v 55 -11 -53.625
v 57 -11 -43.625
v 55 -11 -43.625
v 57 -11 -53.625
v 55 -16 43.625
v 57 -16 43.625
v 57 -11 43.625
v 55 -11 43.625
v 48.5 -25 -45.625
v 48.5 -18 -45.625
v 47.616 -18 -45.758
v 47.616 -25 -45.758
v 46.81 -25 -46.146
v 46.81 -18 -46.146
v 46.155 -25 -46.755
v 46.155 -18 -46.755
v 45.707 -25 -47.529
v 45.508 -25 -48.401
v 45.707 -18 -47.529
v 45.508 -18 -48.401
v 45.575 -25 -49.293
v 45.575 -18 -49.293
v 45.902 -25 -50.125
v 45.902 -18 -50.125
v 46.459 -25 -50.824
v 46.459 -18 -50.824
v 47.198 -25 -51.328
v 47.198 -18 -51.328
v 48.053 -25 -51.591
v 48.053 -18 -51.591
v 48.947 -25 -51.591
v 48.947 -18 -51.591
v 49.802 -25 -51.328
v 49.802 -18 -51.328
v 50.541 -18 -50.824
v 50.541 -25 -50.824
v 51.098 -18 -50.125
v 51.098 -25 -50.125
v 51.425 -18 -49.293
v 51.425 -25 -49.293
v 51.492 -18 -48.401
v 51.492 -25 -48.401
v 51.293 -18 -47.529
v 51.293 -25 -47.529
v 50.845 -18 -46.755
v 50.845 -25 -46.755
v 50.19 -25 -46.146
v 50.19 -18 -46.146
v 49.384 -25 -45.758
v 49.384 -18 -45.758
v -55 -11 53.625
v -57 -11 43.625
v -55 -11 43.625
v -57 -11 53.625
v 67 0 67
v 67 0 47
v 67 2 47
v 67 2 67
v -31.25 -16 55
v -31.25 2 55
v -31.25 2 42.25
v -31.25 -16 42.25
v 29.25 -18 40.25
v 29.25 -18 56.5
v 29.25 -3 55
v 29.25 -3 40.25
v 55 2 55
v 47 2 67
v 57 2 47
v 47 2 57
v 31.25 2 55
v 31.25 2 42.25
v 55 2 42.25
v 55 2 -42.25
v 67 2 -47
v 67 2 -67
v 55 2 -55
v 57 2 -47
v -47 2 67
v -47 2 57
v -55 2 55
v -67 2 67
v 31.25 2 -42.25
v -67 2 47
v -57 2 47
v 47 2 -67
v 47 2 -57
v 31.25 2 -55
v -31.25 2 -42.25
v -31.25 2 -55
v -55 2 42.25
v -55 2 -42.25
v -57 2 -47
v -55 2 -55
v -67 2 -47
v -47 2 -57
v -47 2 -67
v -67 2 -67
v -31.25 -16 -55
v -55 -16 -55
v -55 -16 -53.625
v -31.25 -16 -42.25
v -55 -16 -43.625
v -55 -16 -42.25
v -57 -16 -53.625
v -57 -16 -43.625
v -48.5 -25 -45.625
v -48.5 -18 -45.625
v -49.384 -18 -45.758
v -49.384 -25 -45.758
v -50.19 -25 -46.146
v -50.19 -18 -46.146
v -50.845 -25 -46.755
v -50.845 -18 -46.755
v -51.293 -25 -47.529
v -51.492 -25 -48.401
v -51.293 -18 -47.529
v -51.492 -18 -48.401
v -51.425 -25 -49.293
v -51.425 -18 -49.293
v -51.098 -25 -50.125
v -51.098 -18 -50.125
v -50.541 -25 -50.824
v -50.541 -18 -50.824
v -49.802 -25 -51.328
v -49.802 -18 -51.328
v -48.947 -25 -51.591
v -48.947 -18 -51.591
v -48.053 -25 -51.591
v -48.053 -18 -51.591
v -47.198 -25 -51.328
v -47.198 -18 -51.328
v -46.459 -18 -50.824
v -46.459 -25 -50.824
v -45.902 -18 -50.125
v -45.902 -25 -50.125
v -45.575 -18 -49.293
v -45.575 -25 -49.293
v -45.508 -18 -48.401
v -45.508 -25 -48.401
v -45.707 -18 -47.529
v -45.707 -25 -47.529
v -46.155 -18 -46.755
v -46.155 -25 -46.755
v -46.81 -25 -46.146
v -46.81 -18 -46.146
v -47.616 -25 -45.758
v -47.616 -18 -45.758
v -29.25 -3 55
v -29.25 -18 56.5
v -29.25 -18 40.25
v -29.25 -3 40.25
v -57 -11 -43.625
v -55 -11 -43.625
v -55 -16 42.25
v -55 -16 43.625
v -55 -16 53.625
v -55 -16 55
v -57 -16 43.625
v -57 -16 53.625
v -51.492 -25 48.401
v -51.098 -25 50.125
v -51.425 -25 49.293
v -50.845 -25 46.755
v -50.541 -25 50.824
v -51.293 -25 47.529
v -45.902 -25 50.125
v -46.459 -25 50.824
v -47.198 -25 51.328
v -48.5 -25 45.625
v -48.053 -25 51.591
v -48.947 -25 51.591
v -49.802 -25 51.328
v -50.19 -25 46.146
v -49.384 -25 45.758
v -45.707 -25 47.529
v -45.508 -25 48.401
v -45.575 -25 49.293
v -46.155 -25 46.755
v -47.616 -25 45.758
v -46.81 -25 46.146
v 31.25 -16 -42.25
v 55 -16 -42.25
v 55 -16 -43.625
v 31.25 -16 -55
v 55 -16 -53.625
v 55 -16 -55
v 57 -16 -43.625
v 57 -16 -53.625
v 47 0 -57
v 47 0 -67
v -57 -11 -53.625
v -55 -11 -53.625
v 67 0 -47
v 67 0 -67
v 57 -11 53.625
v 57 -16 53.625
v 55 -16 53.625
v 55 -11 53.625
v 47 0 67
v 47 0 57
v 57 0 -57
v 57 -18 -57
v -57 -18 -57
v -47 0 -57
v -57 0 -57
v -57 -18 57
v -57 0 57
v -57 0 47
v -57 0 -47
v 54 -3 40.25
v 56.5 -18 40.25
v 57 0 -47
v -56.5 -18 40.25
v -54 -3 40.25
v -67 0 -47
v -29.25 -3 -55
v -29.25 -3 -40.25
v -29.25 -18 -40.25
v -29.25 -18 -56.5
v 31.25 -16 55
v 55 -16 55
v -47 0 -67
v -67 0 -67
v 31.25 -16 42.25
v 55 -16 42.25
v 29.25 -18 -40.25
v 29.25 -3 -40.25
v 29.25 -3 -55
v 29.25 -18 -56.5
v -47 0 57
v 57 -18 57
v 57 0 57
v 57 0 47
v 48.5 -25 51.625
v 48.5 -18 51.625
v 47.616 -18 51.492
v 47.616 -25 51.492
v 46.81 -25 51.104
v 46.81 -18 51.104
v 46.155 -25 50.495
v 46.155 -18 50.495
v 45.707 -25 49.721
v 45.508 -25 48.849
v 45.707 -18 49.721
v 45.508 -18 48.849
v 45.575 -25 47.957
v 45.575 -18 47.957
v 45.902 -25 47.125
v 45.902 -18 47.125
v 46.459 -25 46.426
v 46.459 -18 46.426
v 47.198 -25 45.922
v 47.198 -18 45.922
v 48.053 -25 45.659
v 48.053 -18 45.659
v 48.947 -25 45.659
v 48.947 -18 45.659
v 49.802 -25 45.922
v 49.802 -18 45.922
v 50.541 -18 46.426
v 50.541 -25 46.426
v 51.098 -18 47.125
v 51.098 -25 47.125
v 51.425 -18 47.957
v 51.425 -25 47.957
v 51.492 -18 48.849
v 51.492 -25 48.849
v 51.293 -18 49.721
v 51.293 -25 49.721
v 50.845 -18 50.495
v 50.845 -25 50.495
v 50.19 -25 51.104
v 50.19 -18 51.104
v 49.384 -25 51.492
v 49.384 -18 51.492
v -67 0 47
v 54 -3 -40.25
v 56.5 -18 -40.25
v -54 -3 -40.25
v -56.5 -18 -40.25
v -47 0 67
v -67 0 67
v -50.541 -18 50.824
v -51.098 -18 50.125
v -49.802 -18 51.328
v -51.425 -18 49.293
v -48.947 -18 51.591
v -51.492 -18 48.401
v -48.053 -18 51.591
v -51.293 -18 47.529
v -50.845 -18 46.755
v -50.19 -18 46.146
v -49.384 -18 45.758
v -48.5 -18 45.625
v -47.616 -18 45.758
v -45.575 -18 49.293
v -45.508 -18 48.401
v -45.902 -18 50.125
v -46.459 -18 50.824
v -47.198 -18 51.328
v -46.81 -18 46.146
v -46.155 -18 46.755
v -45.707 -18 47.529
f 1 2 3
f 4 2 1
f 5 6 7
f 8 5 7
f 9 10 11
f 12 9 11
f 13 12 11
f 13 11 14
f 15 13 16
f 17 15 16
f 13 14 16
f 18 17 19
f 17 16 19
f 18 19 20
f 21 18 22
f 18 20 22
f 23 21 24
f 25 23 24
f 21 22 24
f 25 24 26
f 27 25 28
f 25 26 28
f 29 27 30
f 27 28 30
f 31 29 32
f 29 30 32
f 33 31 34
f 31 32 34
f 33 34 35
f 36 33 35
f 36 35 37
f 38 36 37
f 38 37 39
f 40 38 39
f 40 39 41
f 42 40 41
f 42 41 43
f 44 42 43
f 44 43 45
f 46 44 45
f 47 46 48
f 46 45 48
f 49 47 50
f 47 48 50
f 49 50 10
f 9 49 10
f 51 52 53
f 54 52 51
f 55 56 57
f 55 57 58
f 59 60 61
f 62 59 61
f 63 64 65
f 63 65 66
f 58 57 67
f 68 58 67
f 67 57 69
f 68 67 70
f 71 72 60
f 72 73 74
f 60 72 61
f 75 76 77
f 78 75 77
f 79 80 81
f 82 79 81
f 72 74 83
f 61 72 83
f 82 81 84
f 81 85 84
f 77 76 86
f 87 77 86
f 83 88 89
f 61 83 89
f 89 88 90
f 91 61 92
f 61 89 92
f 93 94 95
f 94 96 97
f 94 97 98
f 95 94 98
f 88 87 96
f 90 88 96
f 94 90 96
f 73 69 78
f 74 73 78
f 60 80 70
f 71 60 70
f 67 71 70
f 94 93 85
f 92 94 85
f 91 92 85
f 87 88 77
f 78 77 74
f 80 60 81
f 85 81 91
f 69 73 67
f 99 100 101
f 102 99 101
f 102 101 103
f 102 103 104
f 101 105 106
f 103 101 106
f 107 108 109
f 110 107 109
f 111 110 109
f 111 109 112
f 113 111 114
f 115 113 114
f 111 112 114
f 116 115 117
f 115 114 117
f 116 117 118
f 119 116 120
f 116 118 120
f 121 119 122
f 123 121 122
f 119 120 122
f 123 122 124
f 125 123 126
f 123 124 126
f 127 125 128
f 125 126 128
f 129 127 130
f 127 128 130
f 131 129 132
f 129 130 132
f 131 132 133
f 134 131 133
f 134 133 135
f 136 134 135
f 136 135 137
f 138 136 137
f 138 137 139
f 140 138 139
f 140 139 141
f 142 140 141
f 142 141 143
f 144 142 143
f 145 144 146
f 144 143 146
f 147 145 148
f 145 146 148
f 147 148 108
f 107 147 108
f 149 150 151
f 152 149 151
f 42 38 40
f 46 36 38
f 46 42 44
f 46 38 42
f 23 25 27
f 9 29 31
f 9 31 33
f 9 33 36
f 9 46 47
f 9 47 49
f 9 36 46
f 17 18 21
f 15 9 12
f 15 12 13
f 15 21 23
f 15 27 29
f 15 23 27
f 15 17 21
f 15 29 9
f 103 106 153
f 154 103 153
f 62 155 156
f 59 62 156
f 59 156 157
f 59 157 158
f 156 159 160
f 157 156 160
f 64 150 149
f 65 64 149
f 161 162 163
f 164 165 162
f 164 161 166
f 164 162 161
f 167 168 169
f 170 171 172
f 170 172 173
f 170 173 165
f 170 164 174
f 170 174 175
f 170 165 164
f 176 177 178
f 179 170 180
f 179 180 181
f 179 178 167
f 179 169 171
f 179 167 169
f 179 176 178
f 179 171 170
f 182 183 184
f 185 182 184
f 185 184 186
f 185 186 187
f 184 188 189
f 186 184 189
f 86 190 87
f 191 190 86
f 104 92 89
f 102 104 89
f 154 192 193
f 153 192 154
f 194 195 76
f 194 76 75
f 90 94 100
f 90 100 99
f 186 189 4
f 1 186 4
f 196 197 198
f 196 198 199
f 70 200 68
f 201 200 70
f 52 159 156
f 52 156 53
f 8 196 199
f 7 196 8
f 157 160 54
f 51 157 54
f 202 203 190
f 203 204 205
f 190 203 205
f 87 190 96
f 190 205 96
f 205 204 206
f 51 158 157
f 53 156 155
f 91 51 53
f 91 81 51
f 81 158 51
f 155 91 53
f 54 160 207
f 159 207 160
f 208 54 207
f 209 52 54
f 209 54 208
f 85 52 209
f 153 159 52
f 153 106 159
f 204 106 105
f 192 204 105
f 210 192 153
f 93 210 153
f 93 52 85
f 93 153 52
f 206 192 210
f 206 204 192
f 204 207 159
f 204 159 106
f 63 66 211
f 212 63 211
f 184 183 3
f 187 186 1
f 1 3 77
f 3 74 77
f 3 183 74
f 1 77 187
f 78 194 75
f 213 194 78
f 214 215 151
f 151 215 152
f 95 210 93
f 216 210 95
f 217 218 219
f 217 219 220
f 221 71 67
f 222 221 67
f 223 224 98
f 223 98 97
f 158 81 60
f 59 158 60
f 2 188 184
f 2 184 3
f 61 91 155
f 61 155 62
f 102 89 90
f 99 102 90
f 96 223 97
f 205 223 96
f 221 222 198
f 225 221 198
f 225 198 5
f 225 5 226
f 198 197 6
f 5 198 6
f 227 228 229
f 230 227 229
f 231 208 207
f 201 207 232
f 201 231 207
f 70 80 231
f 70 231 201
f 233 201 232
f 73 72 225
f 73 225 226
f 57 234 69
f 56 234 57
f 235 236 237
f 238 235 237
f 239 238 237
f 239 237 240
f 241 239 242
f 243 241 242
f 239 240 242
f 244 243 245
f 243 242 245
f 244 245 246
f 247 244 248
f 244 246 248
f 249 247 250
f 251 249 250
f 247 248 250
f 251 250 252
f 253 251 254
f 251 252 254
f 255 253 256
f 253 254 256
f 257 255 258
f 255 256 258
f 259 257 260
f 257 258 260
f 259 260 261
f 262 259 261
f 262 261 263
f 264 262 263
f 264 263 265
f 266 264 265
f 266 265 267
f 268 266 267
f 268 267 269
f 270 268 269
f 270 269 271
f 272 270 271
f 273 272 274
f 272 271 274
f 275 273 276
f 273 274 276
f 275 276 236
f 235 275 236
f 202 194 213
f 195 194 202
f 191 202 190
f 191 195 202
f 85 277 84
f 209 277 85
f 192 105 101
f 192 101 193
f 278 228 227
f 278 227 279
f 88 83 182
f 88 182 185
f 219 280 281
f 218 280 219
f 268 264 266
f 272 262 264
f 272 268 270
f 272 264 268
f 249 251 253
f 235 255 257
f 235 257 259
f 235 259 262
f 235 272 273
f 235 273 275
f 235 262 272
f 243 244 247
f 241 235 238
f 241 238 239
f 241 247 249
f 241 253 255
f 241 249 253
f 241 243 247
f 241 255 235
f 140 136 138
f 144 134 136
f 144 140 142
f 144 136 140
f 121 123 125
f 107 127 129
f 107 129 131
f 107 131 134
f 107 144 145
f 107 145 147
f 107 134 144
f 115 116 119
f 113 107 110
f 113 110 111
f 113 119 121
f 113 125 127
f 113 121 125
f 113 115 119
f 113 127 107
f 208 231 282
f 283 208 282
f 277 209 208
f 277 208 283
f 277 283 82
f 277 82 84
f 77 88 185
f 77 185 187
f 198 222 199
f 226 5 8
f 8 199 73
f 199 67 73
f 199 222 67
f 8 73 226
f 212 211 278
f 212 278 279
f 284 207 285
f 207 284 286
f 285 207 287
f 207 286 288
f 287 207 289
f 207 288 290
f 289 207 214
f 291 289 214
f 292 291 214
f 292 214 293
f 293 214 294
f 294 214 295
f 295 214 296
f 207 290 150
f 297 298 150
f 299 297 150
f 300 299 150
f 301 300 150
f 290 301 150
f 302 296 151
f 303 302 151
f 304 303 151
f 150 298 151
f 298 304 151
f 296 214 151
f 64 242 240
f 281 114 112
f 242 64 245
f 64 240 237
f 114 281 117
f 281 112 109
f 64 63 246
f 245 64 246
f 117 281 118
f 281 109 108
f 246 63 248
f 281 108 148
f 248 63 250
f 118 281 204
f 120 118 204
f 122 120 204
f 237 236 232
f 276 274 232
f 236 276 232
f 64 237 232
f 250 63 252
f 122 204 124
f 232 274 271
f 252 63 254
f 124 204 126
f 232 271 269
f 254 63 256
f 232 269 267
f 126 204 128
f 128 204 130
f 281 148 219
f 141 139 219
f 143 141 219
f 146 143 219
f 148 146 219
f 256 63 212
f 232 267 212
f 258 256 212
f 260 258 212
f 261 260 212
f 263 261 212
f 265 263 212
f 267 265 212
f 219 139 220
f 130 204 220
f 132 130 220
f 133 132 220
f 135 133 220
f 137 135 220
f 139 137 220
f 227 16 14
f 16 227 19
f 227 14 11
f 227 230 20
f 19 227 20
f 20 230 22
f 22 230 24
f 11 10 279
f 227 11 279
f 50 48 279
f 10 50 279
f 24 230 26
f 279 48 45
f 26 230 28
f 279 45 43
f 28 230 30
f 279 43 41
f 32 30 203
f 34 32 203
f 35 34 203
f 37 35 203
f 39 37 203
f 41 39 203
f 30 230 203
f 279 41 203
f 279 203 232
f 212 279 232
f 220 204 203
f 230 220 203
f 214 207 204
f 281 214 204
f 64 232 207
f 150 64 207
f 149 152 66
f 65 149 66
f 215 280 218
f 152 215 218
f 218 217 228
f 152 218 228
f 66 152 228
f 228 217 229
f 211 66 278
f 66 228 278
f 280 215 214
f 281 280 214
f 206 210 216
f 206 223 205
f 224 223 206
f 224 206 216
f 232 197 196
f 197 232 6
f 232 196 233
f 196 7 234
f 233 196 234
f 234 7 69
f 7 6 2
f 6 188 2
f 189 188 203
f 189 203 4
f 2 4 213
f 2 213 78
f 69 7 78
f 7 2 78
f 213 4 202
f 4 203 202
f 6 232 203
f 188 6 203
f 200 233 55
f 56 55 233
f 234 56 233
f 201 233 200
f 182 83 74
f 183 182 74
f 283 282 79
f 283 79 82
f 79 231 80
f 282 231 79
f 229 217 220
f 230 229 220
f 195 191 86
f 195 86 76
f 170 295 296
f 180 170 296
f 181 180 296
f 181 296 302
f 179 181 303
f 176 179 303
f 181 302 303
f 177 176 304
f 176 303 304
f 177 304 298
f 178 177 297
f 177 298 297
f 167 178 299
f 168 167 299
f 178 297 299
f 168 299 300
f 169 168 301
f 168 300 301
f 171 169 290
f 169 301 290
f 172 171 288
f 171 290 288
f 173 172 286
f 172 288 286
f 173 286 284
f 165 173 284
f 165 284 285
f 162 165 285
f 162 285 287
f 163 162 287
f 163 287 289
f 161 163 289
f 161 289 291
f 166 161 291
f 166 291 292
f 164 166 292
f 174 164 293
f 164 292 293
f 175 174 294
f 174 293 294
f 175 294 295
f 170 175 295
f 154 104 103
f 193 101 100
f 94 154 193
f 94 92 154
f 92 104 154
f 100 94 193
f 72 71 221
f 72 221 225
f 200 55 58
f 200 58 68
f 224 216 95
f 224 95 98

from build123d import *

# Parameters (mm, degrees)
BOSS_EXTRUDE1_DEPTH      = 2
BOSS_EXTRUDE1_DEPTH_BACK = 3
SKETCH1_W                = 120
SKETCH1_H                = 120
SKETCH3_W                = 27.75
SKETCH3_H                = 16.75
BOSS_EXTRUDE4_DEPTH      = 18
SKETCH4_W                = 23.75
SKETCH4_H                = 12.75
CUT_EXTRUDE1_DEPTH       = 18
SKETCH5_R                = 3
BOSS_EXTRUDE5_DEPTH      = 7
SKETCH6_W                = 10
SKETCH6_H                = 5
CUT_EXTRUDE2_DEPTH       = 2
SKETCH7_W                = 10
SKETCH7_H                = 5
CUT_EXTRUDE3_DEPTH       = 2
BOSS_EXTRUDE6_REACH      = 112.411
BOSS_EXTRUDE7_REACH      = 121.478
SKETCH12_W               = 120
SKETCH12_H               = 5
CUT_EXTRUDE4_DEPTH       = 3
SKETCH13_W               = 120
SKETCH13_H               = 5
CUT_EXTRUDE5_DEPTH       = 3
SKETCH14_W               = 114
SKETCH14_H               = 5
CUT_EXTRUDE6_DEPTH       = 3
SKETCH15_W               = 114
SKETCH15_H               = 5
CUT_EXTRUDE7_DEPTH       = 3
BOSS_EXTRUDE8_DEPTH      = 2


with BuildPart() as part:
    # Sketch1 → Boss-Extrude1 (new, two sides: drawn at the far end of the back side and taken through both)
    with BuildSketch(Plane(origin=(0, 0, 0), x_dir=(1, 0, 0), z_dir=(0, 1, 0)).offset(-BOSS_EXTRUDE1_DEPTH_BACK)):
        Rectangle(SKETCH1_W, SKETCH1_H)
    extrude(amount=BOSS_EXTRUDE1_DEPTH + BOSS_EXTRUDE1_DEPTH_BACK)

    # Sketch3 → Boss-Extrude4 (add)
    with BuildSketch(Plane(origin=(0, 0, 0), x_dir=(1, 0, 0), z_dir=(0, 1, 0))):
        with Locations((-43.125, -48.625)):
            Rectangle(SKETCH3_W, SKETCH3_H)
        with Locations((43.125, -48.625)):
            Rectangle(SKETCH3_W, SKETCH3_H)
        with Locations((43.125, 48.625)):
            Rectangle(SKETCH3_W, SKETCH3_H)
        with Locations((-43.125, 48.625)):
            Rectangle(SKETCH3_W, SKETCH3_H)
    extrude(amount=-BOSS_EXTRUDE4_DEPTH)

    # Sketch4 → Cut-Extrude1 (cut)
    with BuildSketch(Plane(origin=(0, 2, 0), x_dir=(1, 0, 0), z_dir=(0, 1, 0))):
        with Locations((-43.125, -48.625)):
            Rectangle(SKETCH4_W, SKETCH4_H)
        with Locations((43.125, -48.625)):
            Rectangle(SKETCH4_W, SKETCH4_H)
        with Locations((43.125, 48.625)):
            Rectangle(SKETCH4_W, SKETCH4_H)
        with Locations((-43.125, 48.625)):
            Rectangle(SKETCH4_W, SKETCH4_H)
    extrude(amount=-CUT_EXTRUDE1_DEPTH, mode=Mode.SUBTRACT)

    # Sketch5 → Boss-Extrude5 (add)
    with BuildSketch(Plane(origin=(0, -18, 0), x_dir=(-1, 0, 0), z_dir=(0, -1, 0))):
        with Locations(Location((48.5, -48.625, 0), (0, 0, 90))):
            Circle(SKETCH5_R)
        with Locations(Location((-48.5, -48.625, 0), (0, 0, 270))):
            Circle(SKETCH5_R)
        with Locations(Location((48.5, 48.625, 0), (0, 0, 270))):
            Circle(SKETCH5_R)
        with Locations(Location((-48.5, 48.625, 0), (0, 0, 270))):
            Circle(SKETCH5_R)
    extrude(amount=BOSS_EXTRUDE5_DEPTH)

    # Sketch6 → Cut-Extrude2 (cut)
    with BuildSketch(Plane(origin=(57, 0, 0), x_dir=(0, 0, -1), z_dir=(1, 0, 0))):
        with Locations((-48.625, -13.5)):
            Rectangle(SKETCH6_W, SKETCH6_H)
        with Locations((48.625, -13.5)):
            Rectangle(SKETCH6_W, SKETCH6_H)
    extrude(amount=-CUT_EXTRUDE2_DEPTH, mode=Mode.SUBTRACT)

    # Sketch7 → Cut-Extrude3 (cut)
    with BuildSketch(Plane.ZY.offset(57)):
        with Locations((48.625, -13.5)):
            Rectangle(SKETCH7_W, SKETCH7_H)
        with Locations((-48.625, -13.5)):
            Rectangle(SKETCH7_W, SKETCH7_H)
    extrude(amount=-CUT_EXTRUDE3_DEPTH, mode=Mode.SUBTRACT)

    # Sketch9 → Boss-Extrude6 (add, up to next)
    with BuildSketch(Plane(origin=(-29.25, 0, 0), x_dir=(0, 0, -1), z_dir=(1, 0, 0)), mode=Mode.PRIVATE) as boss_extrude6_sk1:
        Polygon((57, -3), (55, -3), (56.5, -18), (57, -18), align=None)
    boss_extrude6_tool1 = extrude(boss_extrude6_sk1.sketch, amount=BOSS_EXTRUDE6_REACH, mode=Mode.PRIVATE) - part.part
    # Sketch9 → Boss-Extrude6 (add, up to next)
    with BuildSketch(Plane(origin=(-29.25, 0, 0), x_dir=(0, 0, -1), z_dir=(1, 0, 0)), mode=Mode.PRIVATE) as boss_extrude6_sk2:
        Polygon((-56.5, -18), (-55, -3), (-57, -3), (-57, -18), align=None)
    boss_extrude6_tool2 = extrude(boss_extrude6_sk2.sketch, amount=BOSS_EXTRUDE6_REACH, mode=Mode.PRIVATE) - part.part
    add(boss_extrude6_tool1.solids().sort_by_distance((-29.25, -9, -56.3))[0])
    add(boss_extrude6_tool2.solids().sort_by_distance((-29.25, -9, 56.3))[0])

    # Sketch10 → Boss-Extrude7 (add, up to next)
    with BuildSketch(Plane.XY.offset(-40.25), mode=Mode.PRIVATE) as boss_extrude7_sk1:
        Polygon((-57, -3), (-54, -3), (-56.5, -18), (-57, -18), align=None)
    boss_extrude7_tool1 = extrude(boss_extrude7_sk1.sketch, amount=BOSS_EXTRUDE7_REACH, mode=Mode.PRIVATE) - part.part
    # Sketch10 → Boss-Extrude7 (add, up to next)
    with BuildSketch(Plane.XY.offset(-40.25), mode=Mode.PRIVATE) as boss_extrude7_sk2:
        Polygon((54, -3), (56.5, -18), (57, -18), (57, -3), align=None)
    boss_extrude7_tool2 = extrude(boss_extrude7_sk2.sketch, amount=BOSS_EXTRUDE7_REACH, mode=Mode.PRIVATE) - part.part
    add(boss_extrude7_tool1.solids().sort_by_distance((-55.97619, -8.714286, -40.25))[0])
    add(boss_extrude7_tool2.solids().sort_by_distance((55.97619, -8.714286, -40.25))[0])

    # Sketch12 → Cut-Extrude4 (cut)
    with BuildSketch(Plane.XY.offset(60)):
        with Locations((0, -0.5)):
            Rectangle(SKETCH12_W, SKETCH12_H)
    extrude(amount=-CUT_EXTRUDE4_DEPTH, mode=Mode.SUBTRACT)

    # Sketch13 → Cut-Extrude5 (cut)
    with BuildSketch(Plane(origin=(0, 0, -60), x_dir=(-1, 0, 0), z_dir=(0, 0, -1))):
        with Locations((0, -0.5)):
            Rectangle(SKETCH13_W, SKETCH13_H)
    extrude(amount=-CUT_EXTRUDE5_DEPTH, mode=Mode.SUBTRACT)

    # Sketch14 → Cut-Extrude6 (cut)
    with BuildSketch(Plane.ZY.offset(60)):
        with Locations((0, -0.5)):
            Rectangle(SKETCH14_W, SKETCH14_H)
    extrude(amount=-CUT_EXTRUDE6_DEPTH, mode=Mode.SUBTRACT)

    # Sketch15 → Cut-Extrude7 (cut)
    with BuildSketch(Plane(origin=(60, 0, 0), x_dir=(0, 0, -1), z_dir=(1, 0, 0))):
        with Locations((0, -0.5)):
            Rectangle(SKETCH15_W, SKETCH15_H)
    extrude(amount=-CUT_EXTRUDE7_DEPTH, mode=Mode.SUBTRACT)

    # Sketch16 → Boss-Extrude8 (add)
    with BuildSketch(Plane(origin=(0, 0, 0), x_dir=(1, 0, 0), z_dir=(0, 1, 0))):
        Polygon((-57, 47), (-67, 47), (-67, 67), (-47, 67), (-47, 57), (-57, 57), align=None)
        Polygon((57, 47), (57, 57), (47, 57), (47, 67), (67, 67), (67, 47), align=None)
        Polygon((67, -67), (47, -67), (47, -57), (57, -57), (57, -47), (67, -47), align=None)
        Polygon((-57, -57), (-47, -57), (-47, -67), (-67, -67), (-67, -47), (-57, -47), align=None)
    extrude(amount=BOSS_EXTRUDE8_DEPTH)


solid = part.part
